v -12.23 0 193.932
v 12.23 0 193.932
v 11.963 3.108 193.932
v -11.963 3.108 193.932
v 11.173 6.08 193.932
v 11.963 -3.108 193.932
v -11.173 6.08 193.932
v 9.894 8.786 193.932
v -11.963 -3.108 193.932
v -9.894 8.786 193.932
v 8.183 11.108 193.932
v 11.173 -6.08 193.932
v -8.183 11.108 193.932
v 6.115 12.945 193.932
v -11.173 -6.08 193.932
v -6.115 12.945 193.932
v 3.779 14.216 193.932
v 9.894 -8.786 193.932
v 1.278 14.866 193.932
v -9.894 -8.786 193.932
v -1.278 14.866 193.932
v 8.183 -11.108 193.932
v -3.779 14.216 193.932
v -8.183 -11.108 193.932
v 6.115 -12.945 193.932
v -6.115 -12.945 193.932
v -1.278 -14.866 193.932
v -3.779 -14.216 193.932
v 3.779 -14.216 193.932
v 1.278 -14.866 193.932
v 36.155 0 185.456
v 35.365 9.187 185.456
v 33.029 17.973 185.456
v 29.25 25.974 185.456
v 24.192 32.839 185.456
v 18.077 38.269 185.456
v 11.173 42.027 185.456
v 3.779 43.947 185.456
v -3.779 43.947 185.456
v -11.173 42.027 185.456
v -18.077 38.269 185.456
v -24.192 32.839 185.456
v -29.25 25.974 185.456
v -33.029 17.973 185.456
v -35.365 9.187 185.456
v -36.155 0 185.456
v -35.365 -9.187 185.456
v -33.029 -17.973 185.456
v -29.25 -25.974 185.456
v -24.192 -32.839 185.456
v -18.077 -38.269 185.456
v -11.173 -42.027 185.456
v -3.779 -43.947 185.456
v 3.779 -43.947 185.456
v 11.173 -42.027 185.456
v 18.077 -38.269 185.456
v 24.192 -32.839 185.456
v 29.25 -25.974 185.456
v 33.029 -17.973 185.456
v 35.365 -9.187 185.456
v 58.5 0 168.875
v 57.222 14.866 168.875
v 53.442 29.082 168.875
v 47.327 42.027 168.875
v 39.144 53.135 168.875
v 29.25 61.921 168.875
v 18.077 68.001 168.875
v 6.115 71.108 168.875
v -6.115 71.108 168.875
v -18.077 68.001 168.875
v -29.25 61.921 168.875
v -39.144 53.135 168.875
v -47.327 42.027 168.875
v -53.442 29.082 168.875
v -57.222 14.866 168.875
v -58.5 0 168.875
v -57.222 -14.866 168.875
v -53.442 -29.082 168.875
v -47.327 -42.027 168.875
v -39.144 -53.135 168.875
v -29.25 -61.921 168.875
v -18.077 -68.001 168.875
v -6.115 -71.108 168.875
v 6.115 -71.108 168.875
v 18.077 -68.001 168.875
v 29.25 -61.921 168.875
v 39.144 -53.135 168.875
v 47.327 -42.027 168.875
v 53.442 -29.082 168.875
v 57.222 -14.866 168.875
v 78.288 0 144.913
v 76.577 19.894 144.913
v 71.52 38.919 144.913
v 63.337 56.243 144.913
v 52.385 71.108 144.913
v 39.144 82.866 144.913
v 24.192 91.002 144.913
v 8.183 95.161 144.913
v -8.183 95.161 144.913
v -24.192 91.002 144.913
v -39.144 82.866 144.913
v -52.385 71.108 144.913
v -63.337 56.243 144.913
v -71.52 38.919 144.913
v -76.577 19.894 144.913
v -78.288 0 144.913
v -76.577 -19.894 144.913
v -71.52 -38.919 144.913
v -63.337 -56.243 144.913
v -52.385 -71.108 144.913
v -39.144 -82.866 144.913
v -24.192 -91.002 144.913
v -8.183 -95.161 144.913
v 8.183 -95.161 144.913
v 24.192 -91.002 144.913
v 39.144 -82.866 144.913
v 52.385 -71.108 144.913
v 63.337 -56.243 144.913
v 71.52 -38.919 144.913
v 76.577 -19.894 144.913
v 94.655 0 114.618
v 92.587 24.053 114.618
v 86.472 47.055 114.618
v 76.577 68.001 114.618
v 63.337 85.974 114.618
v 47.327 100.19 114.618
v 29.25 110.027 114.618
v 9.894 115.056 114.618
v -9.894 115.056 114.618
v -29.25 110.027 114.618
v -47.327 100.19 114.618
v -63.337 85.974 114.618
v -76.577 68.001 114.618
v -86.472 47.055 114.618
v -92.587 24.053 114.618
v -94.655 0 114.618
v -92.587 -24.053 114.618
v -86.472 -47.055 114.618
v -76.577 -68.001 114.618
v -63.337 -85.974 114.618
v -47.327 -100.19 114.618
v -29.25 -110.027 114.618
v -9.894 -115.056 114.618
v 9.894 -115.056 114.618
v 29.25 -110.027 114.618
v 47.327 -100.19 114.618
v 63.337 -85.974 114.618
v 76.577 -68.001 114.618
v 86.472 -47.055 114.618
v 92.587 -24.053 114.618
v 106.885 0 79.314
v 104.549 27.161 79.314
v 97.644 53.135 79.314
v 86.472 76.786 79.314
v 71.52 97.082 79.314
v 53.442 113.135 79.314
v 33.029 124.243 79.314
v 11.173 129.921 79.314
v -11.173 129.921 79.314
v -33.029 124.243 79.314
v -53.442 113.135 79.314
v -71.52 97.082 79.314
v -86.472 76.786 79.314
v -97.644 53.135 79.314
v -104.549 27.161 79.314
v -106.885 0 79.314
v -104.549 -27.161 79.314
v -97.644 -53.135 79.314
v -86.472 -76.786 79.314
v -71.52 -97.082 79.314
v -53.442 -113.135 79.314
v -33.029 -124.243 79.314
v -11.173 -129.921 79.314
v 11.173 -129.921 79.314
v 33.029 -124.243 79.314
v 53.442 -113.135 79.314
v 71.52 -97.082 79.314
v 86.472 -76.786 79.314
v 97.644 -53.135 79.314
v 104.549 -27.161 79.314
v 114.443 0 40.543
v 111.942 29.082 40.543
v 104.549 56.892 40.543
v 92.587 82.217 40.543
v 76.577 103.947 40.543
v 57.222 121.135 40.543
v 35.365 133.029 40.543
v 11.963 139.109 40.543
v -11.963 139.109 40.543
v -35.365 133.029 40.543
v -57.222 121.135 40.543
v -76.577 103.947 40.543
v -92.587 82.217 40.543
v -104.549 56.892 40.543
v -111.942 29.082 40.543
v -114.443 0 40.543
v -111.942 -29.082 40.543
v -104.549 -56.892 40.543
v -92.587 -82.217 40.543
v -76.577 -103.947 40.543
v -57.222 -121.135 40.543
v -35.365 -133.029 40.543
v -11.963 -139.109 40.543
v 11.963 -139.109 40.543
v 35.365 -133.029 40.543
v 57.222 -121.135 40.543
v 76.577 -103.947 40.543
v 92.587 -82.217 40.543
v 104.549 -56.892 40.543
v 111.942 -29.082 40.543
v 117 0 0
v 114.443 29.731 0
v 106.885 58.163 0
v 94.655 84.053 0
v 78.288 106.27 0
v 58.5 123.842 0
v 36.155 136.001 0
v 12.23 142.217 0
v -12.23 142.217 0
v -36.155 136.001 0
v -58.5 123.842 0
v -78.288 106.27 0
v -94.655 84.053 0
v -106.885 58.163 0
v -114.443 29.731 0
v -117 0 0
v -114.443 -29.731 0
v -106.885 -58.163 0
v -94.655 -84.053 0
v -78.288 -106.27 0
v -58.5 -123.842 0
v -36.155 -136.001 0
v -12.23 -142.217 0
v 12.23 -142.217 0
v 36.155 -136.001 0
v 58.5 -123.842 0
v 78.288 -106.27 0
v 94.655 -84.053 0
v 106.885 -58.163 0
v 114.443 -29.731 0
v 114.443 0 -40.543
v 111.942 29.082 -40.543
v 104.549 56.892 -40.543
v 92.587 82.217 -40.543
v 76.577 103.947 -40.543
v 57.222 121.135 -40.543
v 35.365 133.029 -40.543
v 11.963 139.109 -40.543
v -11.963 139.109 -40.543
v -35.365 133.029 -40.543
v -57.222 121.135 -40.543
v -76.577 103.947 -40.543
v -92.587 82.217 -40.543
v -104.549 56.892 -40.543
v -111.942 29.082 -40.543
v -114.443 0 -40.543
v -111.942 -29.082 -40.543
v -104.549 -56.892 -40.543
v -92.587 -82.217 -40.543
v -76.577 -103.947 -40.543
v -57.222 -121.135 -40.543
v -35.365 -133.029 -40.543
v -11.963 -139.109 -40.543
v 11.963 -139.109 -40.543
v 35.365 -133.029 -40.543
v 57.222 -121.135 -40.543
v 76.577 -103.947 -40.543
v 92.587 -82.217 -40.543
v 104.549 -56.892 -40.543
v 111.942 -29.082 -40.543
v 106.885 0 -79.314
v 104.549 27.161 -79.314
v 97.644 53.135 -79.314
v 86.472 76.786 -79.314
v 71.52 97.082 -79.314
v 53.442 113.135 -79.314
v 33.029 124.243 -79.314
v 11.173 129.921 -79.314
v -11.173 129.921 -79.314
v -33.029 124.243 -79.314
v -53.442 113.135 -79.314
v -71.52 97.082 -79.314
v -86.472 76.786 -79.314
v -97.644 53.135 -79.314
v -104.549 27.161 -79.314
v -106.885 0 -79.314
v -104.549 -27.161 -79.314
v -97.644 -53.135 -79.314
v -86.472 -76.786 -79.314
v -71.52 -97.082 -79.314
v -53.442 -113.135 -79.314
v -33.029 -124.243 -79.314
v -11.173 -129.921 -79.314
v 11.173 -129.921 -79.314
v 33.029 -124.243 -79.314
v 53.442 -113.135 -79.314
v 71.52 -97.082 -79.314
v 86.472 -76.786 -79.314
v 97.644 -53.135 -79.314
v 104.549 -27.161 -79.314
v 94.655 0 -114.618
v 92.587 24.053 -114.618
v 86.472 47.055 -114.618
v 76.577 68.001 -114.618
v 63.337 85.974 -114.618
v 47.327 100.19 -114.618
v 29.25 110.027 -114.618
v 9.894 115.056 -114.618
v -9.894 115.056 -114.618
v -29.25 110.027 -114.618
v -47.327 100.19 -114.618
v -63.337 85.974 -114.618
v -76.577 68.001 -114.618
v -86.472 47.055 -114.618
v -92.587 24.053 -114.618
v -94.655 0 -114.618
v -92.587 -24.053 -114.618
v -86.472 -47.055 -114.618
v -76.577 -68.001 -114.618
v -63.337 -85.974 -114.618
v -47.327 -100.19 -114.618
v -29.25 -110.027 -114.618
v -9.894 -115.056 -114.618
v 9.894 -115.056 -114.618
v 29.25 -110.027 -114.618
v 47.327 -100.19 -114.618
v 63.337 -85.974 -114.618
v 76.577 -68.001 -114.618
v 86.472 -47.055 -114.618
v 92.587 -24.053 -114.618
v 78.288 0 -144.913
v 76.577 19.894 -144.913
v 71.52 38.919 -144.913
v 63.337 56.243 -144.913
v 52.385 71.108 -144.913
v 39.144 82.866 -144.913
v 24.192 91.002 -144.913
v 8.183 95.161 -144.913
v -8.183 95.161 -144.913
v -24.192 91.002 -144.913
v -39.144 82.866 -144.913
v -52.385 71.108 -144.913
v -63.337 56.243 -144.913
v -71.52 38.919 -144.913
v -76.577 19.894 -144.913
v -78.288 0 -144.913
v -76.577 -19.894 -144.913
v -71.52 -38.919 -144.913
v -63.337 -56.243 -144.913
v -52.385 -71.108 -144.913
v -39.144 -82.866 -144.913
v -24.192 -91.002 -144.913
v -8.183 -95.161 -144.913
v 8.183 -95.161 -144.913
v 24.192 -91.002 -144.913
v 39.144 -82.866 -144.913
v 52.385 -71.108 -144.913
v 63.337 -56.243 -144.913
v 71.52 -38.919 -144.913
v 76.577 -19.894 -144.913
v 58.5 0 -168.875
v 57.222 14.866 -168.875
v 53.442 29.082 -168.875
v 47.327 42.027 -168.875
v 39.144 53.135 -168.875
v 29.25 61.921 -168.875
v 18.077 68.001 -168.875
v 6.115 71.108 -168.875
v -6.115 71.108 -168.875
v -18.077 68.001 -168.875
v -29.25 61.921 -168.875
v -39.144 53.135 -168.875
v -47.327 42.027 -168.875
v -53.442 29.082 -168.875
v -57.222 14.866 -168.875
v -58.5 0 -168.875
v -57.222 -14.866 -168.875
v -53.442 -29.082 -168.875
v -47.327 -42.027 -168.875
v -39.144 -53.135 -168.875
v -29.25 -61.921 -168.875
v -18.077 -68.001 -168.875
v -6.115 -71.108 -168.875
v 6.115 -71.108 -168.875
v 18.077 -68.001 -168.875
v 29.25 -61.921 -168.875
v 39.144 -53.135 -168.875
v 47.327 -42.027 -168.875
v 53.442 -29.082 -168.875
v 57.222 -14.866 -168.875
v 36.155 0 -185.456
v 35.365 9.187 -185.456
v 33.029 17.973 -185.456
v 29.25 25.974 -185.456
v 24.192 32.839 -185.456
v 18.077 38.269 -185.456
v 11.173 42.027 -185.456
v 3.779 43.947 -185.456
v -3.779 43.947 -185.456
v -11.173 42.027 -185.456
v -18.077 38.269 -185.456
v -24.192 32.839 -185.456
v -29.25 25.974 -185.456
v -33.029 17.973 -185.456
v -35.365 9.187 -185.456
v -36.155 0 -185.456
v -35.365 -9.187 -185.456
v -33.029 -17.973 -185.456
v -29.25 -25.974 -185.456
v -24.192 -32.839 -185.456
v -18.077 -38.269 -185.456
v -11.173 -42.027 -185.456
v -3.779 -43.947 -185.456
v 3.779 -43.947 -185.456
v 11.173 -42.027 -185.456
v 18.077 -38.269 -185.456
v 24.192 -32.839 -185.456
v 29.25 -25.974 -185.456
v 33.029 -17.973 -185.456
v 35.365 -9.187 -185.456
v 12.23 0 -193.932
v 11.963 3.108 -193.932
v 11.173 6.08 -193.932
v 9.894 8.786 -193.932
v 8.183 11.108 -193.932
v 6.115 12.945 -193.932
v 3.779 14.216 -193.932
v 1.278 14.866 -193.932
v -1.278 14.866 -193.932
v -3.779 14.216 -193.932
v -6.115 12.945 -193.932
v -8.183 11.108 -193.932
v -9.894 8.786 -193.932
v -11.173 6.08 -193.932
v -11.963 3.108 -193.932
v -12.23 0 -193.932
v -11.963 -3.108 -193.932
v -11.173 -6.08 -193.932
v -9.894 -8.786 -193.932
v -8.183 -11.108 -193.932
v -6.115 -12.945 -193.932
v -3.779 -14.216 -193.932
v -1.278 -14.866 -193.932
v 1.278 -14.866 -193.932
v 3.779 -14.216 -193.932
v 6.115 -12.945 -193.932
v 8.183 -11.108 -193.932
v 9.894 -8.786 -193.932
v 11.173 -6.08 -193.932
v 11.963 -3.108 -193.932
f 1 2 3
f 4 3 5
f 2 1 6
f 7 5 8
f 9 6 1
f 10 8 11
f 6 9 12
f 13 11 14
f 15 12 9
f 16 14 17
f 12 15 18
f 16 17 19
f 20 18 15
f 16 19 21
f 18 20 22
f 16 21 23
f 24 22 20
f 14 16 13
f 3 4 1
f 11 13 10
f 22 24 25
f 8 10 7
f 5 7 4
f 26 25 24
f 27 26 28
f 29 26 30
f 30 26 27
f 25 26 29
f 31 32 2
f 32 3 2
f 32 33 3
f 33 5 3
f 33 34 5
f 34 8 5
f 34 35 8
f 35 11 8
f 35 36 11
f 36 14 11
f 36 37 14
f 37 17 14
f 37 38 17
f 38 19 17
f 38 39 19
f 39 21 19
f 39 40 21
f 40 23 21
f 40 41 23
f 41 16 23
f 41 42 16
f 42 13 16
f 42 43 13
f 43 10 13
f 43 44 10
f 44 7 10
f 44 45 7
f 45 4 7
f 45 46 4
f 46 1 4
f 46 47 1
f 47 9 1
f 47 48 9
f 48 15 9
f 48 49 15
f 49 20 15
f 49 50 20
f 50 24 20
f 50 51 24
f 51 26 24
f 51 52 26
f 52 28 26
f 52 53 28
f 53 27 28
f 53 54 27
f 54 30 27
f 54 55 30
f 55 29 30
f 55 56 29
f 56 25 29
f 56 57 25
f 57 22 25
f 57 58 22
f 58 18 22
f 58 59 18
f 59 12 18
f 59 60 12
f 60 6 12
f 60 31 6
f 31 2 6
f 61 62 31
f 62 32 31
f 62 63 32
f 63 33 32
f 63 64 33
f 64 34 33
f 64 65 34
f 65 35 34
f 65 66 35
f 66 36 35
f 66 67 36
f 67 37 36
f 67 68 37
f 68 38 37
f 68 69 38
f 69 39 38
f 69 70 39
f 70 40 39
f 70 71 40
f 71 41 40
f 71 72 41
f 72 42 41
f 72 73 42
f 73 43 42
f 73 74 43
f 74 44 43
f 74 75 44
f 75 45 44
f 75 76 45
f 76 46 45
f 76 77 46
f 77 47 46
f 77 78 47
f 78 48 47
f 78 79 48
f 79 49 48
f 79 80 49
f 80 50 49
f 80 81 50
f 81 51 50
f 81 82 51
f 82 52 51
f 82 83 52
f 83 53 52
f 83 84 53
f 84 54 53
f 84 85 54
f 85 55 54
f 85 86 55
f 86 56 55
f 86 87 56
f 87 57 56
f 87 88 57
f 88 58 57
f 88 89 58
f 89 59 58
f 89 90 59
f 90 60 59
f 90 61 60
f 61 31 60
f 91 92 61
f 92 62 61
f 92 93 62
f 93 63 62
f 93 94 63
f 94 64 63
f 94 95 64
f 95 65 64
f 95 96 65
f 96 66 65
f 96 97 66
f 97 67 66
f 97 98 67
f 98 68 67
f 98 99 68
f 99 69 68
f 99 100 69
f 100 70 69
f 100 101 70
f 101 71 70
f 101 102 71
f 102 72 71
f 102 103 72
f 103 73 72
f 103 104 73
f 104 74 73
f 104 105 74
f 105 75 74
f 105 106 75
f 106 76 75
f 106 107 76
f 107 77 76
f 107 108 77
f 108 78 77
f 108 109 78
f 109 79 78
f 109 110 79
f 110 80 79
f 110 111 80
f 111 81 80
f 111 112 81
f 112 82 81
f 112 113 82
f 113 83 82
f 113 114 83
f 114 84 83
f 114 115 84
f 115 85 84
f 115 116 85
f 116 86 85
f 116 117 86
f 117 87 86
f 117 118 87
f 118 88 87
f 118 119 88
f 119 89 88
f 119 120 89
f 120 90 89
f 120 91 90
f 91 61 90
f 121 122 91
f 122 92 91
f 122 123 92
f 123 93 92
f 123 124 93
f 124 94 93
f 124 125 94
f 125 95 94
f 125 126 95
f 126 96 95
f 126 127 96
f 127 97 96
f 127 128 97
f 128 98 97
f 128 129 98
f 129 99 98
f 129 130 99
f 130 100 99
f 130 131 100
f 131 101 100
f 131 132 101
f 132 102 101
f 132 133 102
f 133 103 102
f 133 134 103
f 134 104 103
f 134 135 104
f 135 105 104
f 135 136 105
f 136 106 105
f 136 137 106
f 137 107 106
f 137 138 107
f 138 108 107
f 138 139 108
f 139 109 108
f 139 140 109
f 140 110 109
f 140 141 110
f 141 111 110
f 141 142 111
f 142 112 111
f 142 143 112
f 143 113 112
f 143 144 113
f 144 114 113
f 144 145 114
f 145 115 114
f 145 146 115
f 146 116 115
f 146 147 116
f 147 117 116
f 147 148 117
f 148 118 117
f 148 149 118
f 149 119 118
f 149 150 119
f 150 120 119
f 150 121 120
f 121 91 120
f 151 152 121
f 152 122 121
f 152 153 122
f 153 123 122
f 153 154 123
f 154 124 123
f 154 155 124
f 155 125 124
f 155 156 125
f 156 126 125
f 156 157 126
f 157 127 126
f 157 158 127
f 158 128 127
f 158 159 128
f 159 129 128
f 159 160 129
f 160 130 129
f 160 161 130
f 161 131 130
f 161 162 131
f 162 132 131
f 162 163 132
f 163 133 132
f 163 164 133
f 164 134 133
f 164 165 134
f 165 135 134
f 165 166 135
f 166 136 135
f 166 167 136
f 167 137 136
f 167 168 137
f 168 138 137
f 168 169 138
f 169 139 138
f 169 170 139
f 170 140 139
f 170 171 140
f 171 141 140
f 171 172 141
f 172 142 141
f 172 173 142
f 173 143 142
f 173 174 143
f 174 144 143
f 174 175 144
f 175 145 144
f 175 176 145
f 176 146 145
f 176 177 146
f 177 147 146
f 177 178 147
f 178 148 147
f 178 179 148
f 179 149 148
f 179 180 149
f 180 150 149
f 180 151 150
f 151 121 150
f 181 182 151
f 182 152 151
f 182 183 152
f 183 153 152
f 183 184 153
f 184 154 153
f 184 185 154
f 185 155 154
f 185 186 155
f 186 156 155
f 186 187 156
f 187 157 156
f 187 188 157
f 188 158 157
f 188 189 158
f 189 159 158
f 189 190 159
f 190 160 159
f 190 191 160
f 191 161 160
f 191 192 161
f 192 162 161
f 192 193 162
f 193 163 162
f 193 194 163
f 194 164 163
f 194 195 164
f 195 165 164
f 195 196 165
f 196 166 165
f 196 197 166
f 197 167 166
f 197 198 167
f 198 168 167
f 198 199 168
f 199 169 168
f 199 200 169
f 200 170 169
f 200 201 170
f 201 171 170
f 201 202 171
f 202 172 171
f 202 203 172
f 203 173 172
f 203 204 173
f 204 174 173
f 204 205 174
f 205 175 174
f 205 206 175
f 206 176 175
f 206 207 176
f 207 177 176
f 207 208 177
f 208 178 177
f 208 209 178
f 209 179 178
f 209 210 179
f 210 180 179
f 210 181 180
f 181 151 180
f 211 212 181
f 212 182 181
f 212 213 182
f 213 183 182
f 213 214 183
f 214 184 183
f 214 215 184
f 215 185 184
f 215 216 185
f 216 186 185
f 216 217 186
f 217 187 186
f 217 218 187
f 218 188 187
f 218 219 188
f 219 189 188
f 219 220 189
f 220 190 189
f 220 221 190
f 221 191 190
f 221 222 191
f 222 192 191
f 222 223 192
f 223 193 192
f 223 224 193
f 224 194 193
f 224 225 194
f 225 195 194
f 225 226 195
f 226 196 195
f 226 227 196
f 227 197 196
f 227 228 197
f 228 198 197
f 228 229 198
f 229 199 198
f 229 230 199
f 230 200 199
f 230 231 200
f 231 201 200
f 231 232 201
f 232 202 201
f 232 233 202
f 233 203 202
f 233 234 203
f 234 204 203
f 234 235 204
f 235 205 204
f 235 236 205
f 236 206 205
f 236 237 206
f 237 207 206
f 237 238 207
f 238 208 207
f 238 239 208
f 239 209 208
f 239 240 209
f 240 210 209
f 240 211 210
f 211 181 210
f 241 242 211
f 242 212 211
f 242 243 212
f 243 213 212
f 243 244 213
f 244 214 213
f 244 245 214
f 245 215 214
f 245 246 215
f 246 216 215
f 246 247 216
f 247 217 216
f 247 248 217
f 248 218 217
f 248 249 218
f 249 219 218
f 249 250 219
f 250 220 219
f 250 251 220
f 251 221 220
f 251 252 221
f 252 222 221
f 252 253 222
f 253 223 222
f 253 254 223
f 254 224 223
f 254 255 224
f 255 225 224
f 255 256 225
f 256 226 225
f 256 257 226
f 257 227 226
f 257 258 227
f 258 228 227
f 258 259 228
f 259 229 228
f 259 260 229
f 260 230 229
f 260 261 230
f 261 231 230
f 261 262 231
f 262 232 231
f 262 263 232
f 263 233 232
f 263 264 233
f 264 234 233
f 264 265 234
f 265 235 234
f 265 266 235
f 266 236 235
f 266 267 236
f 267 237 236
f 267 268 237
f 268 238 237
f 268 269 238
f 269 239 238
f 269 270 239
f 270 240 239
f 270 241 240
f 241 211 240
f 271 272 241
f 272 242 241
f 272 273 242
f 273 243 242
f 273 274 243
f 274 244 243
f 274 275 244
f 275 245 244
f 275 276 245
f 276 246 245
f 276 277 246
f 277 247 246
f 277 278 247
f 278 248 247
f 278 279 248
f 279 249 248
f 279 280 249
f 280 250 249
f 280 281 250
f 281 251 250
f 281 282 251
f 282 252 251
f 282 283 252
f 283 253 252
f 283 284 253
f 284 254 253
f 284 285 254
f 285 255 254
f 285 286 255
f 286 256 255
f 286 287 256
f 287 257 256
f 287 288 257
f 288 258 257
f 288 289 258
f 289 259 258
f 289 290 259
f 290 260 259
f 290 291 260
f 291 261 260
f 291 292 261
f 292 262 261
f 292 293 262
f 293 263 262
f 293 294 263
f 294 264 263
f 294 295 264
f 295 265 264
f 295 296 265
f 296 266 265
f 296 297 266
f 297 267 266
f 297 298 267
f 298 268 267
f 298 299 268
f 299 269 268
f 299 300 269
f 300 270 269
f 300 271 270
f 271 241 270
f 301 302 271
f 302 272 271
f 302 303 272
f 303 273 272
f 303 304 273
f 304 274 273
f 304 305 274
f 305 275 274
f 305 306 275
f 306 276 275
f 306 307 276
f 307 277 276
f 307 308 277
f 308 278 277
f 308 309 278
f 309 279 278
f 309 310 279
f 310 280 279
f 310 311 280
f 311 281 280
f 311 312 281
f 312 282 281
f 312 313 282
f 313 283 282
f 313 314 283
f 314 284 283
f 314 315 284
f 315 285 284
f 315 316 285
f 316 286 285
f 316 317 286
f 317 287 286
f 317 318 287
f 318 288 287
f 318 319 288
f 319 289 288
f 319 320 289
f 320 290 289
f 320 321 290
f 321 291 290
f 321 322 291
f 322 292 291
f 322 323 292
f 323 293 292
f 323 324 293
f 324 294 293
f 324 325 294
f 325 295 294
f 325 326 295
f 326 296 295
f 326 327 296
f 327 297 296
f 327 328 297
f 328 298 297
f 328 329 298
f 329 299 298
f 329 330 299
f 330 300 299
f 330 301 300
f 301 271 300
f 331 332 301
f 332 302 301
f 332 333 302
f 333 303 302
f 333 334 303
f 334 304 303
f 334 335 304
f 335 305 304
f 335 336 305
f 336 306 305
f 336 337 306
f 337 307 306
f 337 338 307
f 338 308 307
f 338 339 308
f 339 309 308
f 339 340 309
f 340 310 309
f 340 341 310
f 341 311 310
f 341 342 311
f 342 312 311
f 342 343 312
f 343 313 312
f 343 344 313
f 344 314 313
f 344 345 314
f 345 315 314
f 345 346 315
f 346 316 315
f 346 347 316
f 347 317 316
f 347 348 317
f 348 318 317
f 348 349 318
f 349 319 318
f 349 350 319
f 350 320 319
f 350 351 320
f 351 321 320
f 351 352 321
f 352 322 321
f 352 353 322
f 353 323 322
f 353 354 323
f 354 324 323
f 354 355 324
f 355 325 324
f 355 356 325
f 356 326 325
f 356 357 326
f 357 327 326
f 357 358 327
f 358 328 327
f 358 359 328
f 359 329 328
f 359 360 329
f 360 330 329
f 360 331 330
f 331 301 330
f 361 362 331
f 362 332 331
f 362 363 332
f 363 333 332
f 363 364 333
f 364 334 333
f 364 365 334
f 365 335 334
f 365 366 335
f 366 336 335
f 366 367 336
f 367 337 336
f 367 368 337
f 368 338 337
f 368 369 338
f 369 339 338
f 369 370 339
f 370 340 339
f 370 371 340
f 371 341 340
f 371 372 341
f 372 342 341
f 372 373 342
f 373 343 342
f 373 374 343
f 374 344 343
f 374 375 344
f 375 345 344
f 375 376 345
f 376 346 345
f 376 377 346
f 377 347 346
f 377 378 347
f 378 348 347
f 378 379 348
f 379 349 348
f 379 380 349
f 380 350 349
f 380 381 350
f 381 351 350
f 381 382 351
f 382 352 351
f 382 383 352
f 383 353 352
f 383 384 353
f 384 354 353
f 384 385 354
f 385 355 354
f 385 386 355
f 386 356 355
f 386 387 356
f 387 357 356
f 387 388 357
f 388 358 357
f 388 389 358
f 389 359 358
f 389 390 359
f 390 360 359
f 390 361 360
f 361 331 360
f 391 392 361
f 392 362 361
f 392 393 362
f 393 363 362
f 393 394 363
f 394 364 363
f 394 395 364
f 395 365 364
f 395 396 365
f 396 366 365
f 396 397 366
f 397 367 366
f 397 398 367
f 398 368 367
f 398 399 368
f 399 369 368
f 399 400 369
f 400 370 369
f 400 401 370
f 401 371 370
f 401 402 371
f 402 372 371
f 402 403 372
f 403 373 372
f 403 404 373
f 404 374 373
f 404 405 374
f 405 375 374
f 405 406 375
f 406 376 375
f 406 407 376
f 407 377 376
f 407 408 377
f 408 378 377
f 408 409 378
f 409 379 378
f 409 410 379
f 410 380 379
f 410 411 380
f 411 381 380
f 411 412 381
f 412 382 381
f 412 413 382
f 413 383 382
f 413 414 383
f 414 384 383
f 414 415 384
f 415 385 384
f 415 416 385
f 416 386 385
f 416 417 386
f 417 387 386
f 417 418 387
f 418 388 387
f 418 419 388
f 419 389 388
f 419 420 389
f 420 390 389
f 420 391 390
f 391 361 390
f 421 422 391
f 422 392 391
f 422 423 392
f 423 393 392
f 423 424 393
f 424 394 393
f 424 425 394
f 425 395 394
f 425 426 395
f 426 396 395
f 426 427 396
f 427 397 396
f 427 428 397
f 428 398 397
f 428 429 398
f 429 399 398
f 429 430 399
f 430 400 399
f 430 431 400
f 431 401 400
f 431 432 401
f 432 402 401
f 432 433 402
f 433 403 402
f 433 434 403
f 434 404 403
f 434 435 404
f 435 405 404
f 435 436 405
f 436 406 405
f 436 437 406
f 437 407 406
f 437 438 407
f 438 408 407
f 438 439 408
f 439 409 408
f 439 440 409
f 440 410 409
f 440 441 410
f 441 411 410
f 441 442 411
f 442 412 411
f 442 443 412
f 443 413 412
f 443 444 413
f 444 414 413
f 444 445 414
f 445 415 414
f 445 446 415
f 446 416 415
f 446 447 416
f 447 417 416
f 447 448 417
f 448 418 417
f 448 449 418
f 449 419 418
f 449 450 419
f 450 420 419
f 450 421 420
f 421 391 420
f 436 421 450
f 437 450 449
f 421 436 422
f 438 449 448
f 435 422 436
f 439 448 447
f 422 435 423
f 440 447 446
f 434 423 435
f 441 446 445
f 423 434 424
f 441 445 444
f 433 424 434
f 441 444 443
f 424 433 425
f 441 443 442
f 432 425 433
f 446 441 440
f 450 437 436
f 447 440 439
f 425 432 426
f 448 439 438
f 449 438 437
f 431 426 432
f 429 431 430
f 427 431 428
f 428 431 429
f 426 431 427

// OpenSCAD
// Generated by SolidPython 1.0.1 on 2020-07-29 00:46:48


scale(v = [9, 11, 15]) {
	sphere(r = 13);
}
/***********************************************
*********      SolidPython code:      **********
************************************************
 
# import packages: SolidPython
from solid import *
from solid.utils import *
from itertools import chain, combinations, permutations


class Resize:

    def __init__(self, scad_file):
        self.scad_file = scad_file
        #self.scad_file = import_scad(scad_file)
        # cone/cylinder param:
        self.r1 = 0
        self.r2 = 0
        self.h = 0
        # rectangular prism param:
        self.w = 0
        self.l = 0
        # ellipse param:
        self.r = 0

    # import OpenScad code (file name corresponds to shape)


    # classify shape + parameters
    def assign(self, param1, param2, param3):
        if self.scad_file == 'cone.scad':
            self.r1 = param1
            self.r2 = param2
            self.h = param3
        elif self.scad_file == 'cylinder.scad':
            self.r1 = param1
            self.r2 = param2
            self.h = param3
        elif self.scad_file == 'rectangularPrism.scad':
            self.h = param1
            self.l = param2
            self.w = param3
        else:
            self.r = param1
            self.h = param2

    # resize parameters
    def iterate(self):
        x = range(3, 20, 2)
        i = 1
        if self.scad_file == 'cone.scad':
            tempList = list(permutations(x, 2))
            for temp in tempList:
                param1 = temp[0]
                param2 = temp[1]
                filepath = 'produced_scad_files/' + 'cone' + str(param1) + '_' + str(param2) + '_' + '.scad'
                scad_render_to_file(cylinder(h=param1, r1=param2, r2=0), filepath)

        elif self.scad_file == 'cylinder.scad':
            tempList = list(permutations(x, 3))
            for temp in tempList:
                param1 = temp[0]
                param2 = temp[1]
                filepath = 'produced_scad_files/' + 'cylinder' + str(param1) + '_' + str(param2) + '_' + '.scad'
                scad_render_to_file(cylinder(h=param1, r1=param2, r2=param2), filepath)

        elif self.scad_file == 'rectangularPrism.scad':
            tempList = list(permutations(x, 3))
            for temp in tempList:
                param1 = temp[0]
                param2 = temp[1]
                param3 = temp[2]
                filepath = 'produced_scad_files/' + 'rectangularPrism' + str(param1) + '_' + str(param2) + '_' + str(
                    param3) + '.scad'
                scad_render_to_file(cube(size=(param1, param2, param3)), filepath)

        elif self.scad_file == 'ellipse.scad':
            tempList = list(permutations(x, 4))
            for temp in tempList:
                param1 = temp[0]
                param2 = temp[1]
                param3 = temp[2]
                param4 = temp[3]
                filepath = 'produced_scad_files/' + 'ellipse' + str(param1) + '_' + str(param2) + '_' + str(param3) + '_' + str(param4) + '.scad'
                scad_render_to_file(scale([param1, param2, param3])(sphere(r=param4)), filepath)

    def render_to_scadfile(self):
        scad_render_to_file(scad, 'example.scad') 
 
************************************************/
